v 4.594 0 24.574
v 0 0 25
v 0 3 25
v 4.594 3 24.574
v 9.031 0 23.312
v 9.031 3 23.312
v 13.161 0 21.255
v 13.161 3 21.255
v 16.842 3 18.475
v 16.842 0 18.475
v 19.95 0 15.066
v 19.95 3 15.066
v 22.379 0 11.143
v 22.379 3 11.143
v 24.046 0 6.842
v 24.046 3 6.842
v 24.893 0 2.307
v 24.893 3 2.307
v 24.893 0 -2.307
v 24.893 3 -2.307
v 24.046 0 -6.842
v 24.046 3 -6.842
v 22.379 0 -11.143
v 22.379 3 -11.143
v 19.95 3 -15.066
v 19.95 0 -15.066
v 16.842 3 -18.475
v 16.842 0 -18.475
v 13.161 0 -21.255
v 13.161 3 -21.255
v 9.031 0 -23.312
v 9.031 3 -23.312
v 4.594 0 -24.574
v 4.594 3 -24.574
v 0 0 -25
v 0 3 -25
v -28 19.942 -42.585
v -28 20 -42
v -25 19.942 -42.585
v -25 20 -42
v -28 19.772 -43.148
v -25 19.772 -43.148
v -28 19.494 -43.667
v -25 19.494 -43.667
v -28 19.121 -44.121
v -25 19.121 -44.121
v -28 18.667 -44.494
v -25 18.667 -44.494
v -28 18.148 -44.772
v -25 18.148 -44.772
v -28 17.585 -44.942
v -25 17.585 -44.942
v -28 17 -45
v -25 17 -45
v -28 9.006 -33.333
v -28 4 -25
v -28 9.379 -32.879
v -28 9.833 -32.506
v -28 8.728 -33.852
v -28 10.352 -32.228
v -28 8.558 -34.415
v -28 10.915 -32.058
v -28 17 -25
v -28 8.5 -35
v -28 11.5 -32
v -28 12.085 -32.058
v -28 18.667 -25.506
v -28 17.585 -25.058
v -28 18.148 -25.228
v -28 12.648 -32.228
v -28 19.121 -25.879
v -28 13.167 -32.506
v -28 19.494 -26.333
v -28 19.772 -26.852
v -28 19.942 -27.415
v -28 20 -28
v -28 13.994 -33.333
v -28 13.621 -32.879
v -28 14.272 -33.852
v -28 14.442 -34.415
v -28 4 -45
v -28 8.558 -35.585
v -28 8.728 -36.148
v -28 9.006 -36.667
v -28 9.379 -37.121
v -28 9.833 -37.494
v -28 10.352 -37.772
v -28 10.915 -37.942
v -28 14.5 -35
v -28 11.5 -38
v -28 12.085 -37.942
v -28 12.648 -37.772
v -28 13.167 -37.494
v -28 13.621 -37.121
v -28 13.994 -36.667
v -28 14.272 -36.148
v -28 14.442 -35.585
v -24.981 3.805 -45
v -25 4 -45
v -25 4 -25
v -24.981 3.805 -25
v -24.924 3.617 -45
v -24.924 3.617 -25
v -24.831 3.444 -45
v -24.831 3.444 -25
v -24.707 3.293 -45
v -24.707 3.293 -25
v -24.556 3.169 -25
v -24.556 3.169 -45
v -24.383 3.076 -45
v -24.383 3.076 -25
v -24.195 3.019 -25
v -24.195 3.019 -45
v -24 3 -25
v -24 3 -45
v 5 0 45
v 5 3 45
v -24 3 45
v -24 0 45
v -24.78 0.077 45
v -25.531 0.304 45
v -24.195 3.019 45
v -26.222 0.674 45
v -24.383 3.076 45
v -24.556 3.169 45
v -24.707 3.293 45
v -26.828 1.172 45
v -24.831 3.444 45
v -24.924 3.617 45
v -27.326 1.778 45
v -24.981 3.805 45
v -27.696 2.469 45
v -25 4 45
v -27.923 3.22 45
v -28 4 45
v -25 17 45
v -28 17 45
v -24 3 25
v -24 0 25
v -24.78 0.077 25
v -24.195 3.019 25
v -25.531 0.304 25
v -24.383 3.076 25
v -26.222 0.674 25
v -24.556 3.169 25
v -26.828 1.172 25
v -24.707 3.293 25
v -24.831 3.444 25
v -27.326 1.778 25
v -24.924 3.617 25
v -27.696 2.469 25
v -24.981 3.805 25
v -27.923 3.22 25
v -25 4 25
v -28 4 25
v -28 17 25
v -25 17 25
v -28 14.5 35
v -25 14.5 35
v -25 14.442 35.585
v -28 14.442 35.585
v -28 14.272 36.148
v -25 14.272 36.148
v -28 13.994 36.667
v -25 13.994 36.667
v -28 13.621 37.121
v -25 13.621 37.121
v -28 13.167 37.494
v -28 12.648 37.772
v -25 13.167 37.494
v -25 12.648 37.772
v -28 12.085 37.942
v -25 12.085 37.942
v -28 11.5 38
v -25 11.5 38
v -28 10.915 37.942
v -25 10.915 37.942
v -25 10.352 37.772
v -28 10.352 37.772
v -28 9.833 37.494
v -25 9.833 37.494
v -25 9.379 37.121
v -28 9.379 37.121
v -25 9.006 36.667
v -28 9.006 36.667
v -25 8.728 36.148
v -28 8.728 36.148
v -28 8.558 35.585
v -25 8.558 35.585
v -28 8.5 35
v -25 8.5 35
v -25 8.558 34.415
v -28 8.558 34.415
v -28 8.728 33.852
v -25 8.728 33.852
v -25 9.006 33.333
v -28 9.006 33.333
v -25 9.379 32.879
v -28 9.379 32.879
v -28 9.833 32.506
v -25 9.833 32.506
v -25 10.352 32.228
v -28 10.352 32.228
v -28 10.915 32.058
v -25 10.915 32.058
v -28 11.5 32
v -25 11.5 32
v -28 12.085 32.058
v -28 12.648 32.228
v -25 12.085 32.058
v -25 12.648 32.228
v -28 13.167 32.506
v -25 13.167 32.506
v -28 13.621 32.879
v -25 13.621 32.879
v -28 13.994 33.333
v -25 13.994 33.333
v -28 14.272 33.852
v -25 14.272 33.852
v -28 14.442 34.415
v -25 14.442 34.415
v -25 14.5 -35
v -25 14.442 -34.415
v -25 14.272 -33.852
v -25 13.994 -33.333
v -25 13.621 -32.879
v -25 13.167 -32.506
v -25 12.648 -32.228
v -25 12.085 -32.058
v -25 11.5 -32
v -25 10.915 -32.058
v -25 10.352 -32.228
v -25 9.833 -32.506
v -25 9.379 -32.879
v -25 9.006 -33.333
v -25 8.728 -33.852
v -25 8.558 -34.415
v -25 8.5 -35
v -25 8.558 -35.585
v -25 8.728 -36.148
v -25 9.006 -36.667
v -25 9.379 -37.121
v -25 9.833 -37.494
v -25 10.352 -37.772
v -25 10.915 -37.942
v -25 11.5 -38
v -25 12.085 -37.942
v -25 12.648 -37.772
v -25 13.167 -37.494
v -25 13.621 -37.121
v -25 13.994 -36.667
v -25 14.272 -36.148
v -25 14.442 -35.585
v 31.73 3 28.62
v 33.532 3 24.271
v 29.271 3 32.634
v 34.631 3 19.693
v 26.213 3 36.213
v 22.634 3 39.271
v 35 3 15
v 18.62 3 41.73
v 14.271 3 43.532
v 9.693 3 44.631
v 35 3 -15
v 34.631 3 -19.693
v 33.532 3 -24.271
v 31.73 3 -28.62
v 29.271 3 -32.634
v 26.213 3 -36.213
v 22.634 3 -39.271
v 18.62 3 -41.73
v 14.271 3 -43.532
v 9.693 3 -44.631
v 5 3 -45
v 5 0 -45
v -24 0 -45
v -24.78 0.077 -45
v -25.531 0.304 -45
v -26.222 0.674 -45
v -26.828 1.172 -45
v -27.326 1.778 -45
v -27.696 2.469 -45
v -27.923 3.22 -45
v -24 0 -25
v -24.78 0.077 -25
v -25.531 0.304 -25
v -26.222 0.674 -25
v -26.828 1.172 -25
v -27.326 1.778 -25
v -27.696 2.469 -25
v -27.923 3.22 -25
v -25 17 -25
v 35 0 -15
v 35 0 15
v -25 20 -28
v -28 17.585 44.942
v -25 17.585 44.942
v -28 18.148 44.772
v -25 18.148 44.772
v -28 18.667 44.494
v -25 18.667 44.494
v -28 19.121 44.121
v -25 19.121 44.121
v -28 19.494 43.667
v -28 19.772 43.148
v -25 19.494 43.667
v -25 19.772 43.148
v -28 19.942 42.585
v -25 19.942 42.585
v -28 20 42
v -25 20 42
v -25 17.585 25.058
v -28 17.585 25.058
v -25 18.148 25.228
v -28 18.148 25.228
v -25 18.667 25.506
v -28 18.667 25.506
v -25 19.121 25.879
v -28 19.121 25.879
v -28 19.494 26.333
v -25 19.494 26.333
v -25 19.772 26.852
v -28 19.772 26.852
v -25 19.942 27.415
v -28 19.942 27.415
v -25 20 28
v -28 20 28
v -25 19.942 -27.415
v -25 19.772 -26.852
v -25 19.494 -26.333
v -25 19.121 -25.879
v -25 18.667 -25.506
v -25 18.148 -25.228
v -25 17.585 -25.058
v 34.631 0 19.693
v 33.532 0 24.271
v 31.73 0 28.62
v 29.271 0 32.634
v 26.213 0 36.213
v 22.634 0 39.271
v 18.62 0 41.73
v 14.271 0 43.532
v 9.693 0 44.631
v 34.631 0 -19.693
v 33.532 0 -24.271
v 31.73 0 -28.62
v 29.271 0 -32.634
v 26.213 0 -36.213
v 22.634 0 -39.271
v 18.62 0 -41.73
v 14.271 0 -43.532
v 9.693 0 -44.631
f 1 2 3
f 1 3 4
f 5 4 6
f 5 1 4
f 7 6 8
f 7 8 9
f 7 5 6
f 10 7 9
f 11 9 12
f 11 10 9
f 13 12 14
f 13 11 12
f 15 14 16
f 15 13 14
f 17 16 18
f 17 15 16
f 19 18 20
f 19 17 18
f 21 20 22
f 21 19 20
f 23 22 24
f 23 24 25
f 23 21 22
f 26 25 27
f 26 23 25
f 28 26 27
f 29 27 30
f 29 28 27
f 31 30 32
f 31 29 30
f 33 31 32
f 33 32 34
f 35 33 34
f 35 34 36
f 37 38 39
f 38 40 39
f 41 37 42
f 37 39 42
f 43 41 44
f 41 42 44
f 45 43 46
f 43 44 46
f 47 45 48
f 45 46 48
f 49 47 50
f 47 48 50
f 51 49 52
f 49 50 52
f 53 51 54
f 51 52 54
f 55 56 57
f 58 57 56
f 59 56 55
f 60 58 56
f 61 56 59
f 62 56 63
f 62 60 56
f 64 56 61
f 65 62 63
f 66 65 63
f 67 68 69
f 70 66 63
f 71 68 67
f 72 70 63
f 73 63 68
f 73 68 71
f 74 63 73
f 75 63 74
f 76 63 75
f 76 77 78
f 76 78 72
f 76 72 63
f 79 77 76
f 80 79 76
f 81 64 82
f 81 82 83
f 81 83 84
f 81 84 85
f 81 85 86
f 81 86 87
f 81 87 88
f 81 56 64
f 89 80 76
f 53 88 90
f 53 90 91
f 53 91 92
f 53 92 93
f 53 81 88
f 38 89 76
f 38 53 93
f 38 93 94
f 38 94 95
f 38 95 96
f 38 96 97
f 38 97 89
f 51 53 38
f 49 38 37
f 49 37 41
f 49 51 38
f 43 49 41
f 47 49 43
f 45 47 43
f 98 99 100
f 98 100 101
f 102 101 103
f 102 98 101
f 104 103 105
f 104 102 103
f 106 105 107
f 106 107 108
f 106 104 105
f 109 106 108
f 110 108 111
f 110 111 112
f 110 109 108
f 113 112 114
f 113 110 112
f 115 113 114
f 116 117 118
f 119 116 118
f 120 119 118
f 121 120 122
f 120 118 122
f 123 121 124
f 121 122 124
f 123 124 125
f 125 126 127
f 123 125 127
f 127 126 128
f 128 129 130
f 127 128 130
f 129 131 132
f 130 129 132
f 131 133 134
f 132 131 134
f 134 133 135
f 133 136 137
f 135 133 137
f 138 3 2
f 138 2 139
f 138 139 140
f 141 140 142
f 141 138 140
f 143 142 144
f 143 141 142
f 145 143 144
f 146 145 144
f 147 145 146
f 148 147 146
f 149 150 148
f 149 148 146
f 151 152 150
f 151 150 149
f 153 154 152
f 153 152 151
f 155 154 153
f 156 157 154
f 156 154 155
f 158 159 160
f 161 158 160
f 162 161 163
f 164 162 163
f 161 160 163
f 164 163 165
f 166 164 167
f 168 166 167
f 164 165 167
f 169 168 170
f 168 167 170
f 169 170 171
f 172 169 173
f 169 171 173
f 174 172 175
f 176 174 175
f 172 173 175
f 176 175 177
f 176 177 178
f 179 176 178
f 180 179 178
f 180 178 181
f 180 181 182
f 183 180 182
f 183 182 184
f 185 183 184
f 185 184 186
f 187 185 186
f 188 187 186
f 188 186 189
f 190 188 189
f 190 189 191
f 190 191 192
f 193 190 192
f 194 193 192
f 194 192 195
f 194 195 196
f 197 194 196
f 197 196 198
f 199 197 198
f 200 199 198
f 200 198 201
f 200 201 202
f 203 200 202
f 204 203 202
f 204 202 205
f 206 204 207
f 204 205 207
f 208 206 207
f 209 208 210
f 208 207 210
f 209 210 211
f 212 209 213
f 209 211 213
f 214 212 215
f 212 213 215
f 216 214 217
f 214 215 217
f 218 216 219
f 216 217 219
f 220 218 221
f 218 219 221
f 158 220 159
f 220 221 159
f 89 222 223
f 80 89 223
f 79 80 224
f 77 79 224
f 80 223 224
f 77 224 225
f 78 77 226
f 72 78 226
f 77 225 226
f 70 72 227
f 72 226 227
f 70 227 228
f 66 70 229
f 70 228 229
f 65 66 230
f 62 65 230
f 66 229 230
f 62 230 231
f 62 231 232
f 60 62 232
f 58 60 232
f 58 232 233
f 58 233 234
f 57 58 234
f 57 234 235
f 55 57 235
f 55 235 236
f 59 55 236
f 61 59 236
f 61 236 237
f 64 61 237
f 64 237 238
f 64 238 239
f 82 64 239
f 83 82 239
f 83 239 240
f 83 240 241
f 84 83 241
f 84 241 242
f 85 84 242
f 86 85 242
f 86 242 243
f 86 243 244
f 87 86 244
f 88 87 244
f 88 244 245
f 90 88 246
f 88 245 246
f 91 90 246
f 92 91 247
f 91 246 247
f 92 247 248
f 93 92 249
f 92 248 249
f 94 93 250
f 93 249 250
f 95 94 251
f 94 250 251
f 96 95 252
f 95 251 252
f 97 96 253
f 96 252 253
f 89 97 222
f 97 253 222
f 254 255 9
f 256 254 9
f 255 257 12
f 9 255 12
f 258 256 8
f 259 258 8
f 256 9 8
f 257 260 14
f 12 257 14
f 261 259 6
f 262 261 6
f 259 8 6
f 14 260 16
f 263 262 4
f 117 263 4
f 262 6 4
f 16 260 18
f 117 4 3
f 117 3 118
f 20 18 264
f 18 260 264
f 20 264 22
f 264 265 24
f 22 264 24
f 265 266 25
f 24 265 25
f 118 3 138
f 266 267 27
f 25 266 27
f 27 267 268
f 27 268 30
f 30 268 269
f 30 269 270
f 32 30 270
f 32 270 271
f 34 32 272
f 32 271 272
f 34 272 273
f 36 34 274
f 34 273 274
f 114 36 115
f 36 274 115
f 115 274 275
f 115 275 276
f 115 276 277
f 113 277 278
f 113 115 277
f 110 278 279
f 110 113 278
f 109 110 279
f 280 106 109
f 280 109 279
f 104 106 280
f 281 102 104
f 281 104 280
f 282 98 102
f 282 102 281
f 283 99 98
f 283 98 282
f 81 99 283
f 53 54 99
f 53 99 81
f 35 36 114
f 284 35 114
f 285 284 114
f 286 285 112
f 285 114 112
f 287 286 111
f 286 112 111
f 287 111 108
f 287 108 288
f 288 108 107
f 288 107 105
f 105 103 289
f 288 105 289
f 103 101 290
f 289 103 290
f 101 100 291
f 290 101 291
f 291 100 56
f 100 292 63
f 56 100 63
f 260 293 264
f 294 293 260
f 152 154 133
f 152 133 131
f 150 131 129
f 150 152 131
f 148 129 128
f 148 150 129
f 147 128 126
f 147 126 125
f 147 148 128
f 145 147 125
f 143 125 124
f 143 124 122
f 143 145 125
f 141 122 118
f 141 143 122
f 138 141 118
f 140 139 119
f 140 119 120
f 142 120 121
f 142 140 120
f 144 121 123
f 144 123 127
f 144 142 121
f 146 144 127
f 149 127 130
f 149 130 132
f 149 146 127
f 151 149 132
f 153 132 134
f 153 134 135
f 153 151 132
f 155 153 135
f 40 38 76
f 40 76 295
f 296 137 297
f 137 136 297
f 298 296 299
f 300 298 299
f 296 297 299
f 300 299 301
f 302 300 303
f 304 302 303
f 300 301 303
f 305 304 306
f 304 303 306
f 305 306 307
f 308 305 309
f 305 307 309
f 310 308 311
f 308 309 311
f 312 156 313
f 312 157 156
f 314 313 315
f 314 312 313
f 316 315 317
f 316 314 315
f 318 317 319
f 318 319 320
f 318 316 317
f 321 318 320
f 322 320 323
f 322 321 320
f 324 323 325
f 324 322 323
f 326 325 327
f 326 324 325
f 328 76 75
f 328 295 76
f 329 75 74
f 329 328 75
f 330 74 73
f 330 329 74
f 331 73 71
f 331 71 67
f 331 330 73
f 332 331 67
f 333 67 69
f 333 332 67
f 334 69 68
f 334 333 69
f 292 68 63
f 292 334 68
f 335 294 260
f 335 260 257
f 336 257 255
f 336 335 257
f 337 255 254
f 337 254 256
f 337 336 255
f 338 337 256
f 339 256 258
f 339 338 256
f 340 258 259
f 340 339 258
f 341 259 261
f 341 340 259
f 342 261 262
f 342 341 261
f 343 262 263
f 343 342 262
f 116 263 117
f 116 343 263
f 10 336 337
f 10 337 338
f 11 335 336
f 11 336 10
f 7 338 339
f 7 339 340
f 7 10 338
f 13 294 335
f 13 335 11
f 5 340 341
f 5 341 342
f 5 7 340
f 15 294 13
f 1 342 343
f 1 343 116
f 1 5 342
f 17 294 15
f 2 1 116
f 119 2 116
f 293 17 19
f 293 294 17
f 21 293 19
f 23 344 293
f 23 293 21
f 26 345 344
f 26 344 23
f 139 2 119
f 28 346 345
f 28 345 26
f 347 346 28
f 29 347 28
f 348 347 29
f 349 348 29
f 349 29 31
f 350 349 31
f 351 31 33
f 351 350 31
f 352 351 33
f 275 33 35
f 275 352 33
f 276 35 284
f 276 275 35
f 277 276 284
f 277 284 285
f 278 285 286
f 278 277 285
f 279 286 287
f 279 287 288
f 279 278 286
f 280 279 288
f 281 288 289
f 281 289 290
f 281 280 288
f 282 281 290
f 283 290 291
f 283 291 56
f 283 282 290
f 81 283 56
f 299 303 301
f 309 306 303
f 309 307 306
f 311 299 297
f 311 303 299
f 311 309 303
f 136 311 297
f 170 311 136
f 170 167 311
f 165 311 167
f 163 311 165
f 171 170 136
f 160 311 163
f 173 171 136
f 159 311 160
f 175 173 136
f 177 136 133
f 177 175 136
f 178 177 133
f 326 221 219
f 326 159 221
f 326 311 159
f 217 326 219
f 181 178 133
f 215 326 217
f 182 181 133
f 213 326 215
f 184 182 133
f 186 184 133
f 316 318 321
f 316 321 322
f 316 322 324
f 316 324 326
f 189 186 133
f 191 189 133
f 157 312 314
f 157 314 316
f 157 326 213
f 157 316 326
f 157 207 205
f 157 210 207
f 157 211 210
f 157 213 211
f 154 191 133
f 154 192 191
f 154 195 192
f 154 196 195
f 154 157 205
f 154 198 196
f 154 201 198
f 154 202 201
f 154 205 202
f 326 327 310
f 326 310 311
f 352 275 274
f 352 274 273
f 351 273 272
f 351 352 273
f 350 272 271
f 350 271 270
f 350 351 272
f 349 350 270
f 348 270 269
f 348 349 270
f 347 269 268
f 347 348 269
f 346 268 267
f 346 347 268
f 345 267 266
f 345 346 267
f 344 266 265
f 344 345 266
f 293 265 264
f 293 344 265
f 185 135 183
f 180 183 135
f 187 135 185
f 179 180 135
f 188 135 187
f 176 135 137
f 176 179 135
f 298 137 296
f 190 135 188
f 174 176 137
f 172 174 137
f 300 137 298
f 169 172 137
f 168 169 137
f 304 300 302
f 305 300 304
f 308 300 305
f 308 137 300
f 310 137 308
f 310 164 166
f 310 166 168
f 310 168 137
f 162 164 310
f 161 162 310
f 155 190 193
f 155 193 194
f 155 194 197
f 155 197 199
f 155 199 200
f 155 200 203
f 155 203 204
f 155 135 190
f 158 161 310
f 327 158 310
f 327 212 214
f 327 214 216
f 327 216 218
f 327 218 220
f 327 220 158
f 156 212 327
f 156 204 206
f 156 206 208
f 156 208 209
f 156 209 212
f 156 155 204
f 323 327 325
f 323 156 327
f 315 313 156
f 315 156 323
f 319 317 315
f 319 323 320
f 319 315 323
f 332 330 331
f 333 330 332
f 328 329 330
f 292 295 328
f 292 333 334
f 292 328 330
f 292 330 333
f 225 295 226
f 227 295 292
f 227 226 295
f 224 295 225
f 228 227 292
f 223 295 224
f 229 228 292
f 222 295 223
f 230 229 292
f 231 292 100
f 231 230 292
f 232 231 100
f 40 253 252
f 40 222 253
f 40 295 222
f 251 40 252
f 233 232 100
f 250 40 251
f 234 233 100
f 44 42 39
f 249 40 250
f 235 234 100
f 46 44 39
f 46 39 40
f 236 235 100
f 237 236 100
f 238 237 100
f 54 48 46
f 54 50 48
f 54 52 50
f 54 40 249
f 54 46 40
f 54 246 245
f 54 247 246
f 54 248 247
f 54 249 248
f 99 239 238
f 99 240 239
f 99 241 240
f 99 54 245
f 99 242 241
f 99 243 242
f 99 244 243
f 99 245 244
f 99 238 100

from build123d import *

# Parameters (mm, degrees)
BOSS_EXTRUDE1_DEPTH            = 3
EDGE_FLANGE1_STRIP_W           = 14
EDGE_FLANGE1_STRIP_H           = 3
EDGE_FLANGE1_STRIP_CUT_DEPTH   = 20
EDGE_FLANGE1_STRIP_2_W         = 14
EDGE_FLANGE1_STRIP_2_H         = 3
EDGE_FLANGE1_STRIP_CUT_2_DEPTH = 20
EDGE_FLANGE1_DEPTH             = 20
EDGE_FLANGE1_BEND_DEPTH        = 20
FILLET1_R                      = 3
CUT_EXTRUDE1_REACH             = 79.621
SKETCH12_R                     = 3


# Sheet-metal steps are written as plain solids
with BuildPart() as part:
    # Sketch1 → Boss-Extrude1 (new body)
    with BuildSketch(Plane(origin=(0, 0, 0), x_dir=(1, 0, 0), z_dir=(0, 1, 0))):
        with BuildLine():
            Line((0, 25), (-25, 25))
            Line((-25, 25), (-25, 45))
            Line((-25, 45), (5, 45))
            ThreePointArc((5, 45), (26.213203436, 36.213203436), (35, 15))
            Line((35, 15), (35, -15))
            ThreePointArc((35, -15), (26.213203436, -36.213203436), (5, -45))
            Line((5, -45), (-25, -45))
            Line((-25, -45), (-25, -25))
            Line((-25, -25), (0, -25))
            ThreePointArc((0, -25), (25, 0), (0, 25))
        make_face()
    extrude(amount=BOSS_EXTRUDE1_DEPTH)

    # Edge-Flange1 strip (across the edge) → Edge-Flange1 strip cut (cut)
    with BuildSketch(Plane(origin=(-25, 3, 25), x_dir=(1, 0, 0), z_dir=(0, 0, 1))):
        with Locations((-6, -1.5)):
            Rectangle(EDGE_FLANGE1_STRIP_W, EDGE_FLANGE1_STRIP_H)
    extrude(amount=EDGE_FLANGE1_STRIP_CUT_DEPTH, mode=Mode.SUBTRACT)

    # Edge-Flange1 strip 2 (across the edge) → Edge-Flange1 strip cut 2 (cut)
    with BuildSketch(Plane(origin=(-25, 3, -45), x_dir=(1, 0, 0), z_dir=(0, 0, 1))):
        with Locations((-6, -1.5)):
            Rectangle(EDGE_FLANGE1_STRIP_2_W, EDGE_FLANGE1_STRIP_2_H)
    extrude(amount=EDGE_FLANGE1_STRIP_CUT_2_DEPTH, mode=Mode.SUBTRACT)

    # Edge-Flange1 section (across the edge) → Edge-Flange1 (add)
    with BuildSketch(Plane(origin=(-25, 3, 25), x_dir=(1, 0, 0), z_dir=(0, 0, 1))):
        with BuildLine():
            Line((-3, 1), (-3, 17))
            Line((-3, 17), (0, 17))
            Line((0, 17), (0, 1))
            ThreePointArc((0, 1), (0.292893219, 0.292893219), (1, 0))
            Line((1, 0), (1, -3))
            ThreePointArc((1, -3), (-1.828427125, -1.828427125), (-3, 1))
        make_face()
    extrude(amount=EDGE_FLANGE1_DEPTH)

    # Edge-Flange1 section 2 (across the edge) → Edge-Flange1 bend (add)
    with BuildSketch(Plane(origin=(-25, 3, -45), x_dir=(1, 0, 0), z_dir=(0, 0, 1))):
        with BuildLine():
            Line((-3, 1), (-3, 17))
            Line((-3, 17), (0, 17))
            Line((0, 17), (0, 1))
            ThreePointArc((0, 1), (0.292893219, 0.292893219), (1, 0))
            Line((1, 0), (1, -3))
            ThreePointArc((1, -3), (-1.828427125, -1.828427125), (-3, 1))
        make_face()
    extrude(amount=EDGE_FLANGE1_BEND_DEPTH)

    # Fillet1
    fillet1_edges = [part.edges().sort_by_distance(p)[0] for p in [
        (-26.5, 20, 25),
        (-26.5, 20, 45),
        (-26.5, 20, -45),
        (-26.5, 20, -25),
    ]]
    fillet(fillet1_edges, radius=FILLET1_R)

    # Sketch12 → Cut-Extrude1 (cut, up to next)
    with BuildSketch(Plane(origin=(-25, 0, 0), x_dir=(0, 0, -1), z_dir=(1, 0, 0)), mode=Mode.PRIVATE) as cut_extrude1_sk1:
        with Locations(Location((35, 11.5, 0), (0, 0, 90))):
            Circle(SKETCH12_R)
    cut_extrude1_tool1 = extrude(cut_extrude1_sk1.sketch, amount=-CUT_EXTRUDE1_REACH, mode=Mode.PRIVATE) & part.part
    # Sketch12 → Cut-Extrude1 (cut, up to next)
    with BuildSketch(Plane(origin=(-25, 0, 0), x_dir=(0, 0, -1), z_dir=(1, 0, 0)), mode=Mode.PRIVATE) as cut_extrude1_sk2:
        with Locations(Location((-35, 11.5, 0), (0, 0, 90))):
            Circle(SKETCH12_R)
    cut_extrude1_tool2 = extrude(cut_extrude1_sk2.sketch, amount=-CUT_EXTRUDE1_REACH, mode=Mode.PRIVATE) & part.part
    add(cut_extrude1_tool1.solids().sort_by_distance((-25, 11.5, -35))[0], mode=Mode.SUBTRACT)
    add(cut_extrude1_tool2.solids().sort_by_distance((-25, 11.5, 35))[0], mode=Mode.SUBTRACT)


solid = part.part
